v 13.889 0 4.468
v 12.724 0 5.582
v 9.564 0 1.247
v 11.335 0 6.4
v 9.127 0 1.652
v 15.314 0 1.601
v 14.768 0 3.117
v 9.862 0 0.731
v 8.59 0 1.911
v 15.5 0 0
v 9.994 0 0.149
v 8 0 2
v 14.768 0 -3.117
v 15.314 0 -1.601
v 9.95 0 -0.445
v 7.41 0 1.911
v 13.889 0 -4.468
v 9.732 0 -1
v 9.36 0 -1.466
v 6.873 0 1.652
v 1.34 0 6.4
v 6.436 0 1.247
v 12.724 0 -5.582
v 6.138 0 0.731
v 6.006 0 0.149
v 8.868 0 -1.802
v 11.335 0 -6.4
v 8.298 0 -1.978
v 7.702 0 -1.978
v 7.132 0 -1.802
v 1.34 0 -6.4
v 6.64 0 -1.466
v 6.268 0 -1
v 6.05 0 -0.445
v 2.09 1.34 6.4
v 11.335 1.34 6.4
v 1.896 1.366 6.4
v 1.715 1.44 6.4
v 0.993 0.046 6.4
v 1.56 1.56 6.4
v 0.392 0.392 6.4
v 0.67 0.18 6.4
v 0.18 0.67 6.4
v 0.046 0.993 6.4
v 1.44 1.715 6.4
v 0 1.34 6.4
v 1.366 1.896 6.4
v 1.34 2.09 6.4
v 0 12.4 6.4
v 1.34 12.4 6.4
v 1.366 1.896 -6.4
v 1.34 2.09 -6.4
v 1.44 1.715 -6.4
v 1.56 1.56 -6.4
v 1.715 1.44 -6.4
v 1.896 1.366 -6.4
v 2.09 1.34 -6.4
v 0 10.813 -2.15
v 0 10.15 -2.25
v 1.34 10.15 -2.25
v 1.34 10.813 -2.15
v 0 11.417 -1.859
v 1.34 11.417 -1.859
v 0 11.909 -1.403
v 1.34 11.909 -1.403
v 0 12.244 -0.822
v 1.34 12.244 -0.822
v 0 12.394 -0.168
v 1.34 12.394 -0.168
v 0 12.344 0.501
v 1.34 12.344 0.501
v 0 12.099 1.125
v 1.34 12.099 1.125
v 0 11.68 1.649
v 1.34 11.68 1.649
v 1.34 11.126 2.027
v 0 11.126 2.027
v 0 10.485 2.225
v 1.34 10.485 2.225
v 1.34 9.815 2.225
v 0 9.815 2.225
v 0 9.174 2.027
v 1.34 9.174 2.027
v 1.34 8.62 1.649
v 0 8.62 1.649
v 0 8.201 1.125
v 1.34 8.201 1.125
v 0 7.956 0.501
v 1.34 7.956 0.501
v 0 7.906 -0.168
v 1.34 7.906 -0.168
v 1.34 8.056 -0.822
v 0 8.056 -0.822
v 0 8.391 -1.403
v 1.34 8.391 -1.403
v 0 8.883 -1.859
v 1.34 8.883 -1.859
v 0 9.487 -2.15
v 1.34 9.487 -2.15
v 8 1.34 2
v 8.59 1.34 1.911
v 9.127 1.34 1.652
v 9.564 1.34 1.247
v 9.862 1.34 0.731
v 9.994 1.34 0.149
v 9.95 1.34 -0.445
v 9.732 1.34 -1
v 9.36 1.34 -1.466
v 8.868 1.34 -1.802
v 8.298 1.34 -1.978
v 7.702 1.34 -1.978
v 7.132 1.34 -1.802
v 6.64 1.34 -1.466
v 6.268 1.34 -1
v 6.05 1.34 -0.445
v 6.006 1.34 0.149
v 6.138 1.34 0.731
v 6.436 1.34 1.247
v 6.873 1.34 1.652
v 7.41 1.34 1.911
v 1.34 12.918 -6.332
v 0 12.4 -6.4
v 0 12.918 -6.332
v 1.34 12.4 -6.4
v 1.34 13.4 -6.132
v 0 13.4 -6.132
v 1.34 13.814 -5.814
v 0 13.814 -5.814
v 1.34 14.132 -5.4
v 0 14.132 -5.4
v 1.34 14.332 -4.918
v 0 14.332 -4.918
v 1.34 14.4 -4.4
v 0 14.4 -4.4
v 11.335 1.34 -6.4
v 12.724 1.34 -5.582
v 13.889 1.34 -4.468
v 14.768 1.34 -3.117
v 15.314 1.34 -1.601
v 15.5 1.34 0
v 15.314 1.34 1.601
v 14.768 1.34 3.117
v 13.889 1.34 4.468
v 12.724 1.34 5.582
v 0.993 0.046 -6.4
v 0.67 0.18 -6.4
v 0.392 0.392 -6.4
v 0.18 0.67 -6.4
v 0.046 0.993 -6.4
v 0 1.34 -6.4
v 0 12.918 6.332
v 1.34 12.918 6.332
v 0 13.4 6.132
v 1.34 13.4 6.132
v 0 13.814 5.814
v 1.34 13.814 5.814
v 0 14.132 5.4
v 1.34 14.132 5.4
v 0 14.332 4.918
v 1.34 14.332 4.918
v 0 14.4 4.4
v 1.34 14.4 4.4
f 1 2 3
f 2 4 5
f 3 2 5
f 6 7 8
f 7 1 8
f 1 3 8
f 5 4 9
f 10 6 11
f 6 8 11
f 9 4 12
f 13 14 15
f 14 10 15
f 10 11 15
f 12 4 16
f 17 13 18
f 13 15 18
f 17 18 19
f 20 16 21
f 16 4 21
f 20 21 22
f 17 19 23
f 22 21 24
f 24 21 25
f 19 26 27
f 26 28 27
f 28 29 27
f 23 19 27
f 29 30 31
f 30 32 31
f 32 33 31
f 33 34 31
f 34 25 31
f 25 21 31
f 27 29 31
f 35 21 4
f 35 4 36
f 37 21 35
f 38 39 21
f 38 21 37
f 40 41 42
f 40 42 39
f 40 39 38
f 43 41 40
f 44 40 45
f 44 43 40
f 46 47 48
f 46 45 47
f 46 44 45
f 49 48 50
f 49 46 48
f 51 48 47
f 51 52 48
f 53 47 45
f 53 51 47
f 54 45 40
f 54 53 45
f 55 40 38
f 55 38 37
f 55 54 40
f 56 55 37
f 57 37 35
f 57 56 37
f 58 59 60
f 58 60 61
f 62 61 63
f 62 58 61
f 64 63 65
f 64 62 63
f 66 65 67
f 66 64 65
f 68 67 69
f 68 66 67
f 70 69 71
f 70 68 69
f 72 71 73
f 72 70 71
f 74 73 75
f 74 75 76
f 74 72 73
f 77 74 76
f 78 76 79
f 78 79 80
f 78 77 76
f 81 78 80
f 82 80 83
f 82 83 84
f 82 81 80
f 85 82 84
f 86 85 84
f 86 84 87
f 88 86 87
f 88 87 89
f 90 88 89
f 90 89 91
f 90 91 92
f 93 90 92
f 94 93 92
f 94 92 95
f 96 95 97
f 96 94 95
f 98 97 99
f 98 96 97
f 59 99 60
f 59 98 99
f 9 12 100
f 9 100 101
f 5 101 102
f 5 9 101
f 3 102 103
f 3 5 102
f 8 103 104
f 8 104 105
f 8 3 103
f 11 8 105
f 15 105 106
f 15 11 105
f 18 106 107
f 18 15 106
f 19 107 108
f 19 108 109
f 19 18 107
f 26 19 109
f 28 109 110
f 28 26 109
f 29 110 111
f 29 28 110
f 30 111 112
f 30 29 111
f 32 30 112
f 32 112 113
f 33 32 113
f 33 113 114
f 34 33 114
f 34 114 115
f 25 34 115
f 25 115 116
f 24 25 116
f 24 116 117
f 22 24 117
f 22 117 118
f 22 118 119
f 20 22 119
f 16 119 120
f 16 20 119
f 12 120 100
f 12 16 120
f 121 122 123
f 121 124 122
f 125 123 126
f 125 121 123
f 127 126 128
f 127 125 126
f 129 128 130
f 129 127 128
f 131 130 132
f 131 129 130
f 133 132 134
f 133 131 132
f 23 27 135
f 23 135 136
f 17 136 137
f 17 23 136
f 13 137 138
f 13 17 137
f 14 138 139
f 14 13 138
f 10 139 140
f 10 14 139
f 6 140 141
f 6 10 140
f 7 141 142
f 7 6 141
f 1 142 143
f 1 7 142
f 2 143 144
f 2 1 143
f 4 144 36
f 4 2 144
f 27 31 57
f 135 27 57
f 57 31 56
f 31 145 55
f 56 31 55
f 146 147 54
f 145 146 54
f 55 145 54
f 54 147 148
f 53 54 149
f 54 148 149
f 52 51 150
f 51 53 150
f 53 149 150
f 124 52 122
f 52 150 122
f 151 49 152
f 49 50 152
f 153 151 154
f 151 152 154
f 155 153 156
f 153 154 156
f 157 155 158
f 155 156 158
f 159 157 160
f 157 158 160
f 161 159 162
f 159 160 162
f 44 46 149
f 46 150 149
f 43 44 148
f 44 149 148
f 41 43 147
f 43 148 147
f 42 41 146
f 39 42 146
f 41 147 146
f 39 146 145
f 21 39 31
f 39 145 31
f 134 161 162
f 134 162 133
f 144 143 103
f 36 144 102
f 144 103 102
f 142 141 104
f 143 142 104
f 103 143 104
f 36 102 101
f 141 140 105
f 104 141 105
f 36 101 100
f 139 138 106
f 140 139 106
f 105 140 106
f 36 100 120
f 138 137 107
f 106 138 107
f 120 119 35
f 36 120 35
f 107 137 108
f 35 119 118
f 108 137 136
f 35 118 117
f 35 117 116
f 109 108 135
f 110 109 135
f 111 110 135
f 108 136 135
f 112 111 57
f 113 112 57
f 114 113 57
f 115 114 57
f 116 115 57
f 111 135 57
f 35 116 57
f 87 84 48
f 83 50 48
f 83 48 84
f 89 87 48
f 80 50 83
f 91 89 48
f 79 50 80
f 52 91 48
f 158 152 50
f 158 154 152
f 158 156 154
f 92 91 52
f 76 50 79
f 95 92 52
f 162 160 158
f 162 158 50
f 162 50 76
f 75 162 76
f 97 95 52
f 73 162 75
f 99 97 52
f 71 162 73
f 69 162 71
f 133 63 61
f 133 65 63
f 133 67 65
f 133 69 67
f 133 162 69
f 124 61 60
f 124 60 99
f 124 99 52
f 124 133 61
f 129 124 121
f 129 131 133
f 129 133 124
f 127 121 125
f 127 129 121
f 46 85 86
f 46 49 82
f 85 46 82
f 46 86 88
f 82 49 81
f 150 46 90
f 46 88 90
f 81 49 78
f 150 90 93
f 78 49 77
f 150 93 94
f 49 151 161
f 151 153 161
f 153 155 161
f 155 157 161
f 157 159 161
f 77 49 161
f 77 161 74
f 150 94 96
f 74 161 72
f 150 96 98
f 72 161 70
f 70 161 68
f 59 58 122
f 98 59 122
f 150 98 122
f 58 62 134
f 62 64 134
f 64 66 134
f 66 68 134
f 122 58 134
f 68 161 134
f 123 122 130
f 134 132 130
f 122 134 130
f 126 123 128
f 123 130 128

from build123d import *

# Parameters (mm, degrees)
SKETCH1_W           = 12.8
SKETCH1_H           = 14.4
SKETCH1_R           = 2.25
BOSS_EXTRUDE1_DEPTH = 1.34
SKETCH2_R           = 2
BOSS_EXTRUDE2_DEPTH = 1.34
FILLET2_R           = 2
FILLET3_R           = 0.75
FILLET4_R           = 1.34


with BuildPart() as part:
    # Sketch1 → Boss-Extrude1 (new body)
    with BuildSketch(Plane(origin=(0, 0, 0), x_dir=(0, 0, -1), z_dir=(1, 0, 0))):
        with Locations((0, 7.2)):
            Rectangle(SKETCH1_W, SKETCH1_H)
        with Locations((0, 10.15)):
            Circle(SKETCH1_R, mode=Mode.SUBTRACT)
    extrude(amount=BOSS_EXTRUDE1_DEPTH)

    # Sketch2 → Boss-Extrude2 (add)
    with BuildSketch(Plane(origin=(0, 0, 0), x_dir=(1, 0, 0), z_dir=(0, 1, 0))):
        with BuildLine():
            Line((0, 6.4), (11.335489376, 6.4))
            ThreePointArc((11.335489376, 6.4), (15.5, 0), (11.335489376, -6.4))
            Line((11.335489376, -6.4), (0, -6.4))
            Line((0, -6.4), (0, 6.4))
        make_face()
        with Locations(Location((8, 0, 0), (0, 0, 270))):
            Circle(SKETCH2_R, mode=Mode.SUBTRACT)
    extrude(amount=BOSS_EXTRUDE2_DEPTH)

    # Fillet2
    fillet2_edges = [part.edges().sort_by_distance(p)[0] for p in [
        (0.67, 14.4, -6.4),
        (0.67, 14.4, 6.4),
    ]]
    fillet(fillet2_edges, radius=FILLET2_R)

    # Fillet3
    fillet3_edges = [part.edges().sort_by_distance(p)[0] for p in [
        (1.34, 1.34, 0),
    ]]
    fillet(fillet3_edges, radius=FILLET3_R)

    # Fillet4
    fillet4_edges = [part.edges().sort_by_distance(p)[0] for p in [
        (0, 0, 0),
    ]]
    fillet(fillet4_edges, radius=FILLET4_R)


solid = part.part
